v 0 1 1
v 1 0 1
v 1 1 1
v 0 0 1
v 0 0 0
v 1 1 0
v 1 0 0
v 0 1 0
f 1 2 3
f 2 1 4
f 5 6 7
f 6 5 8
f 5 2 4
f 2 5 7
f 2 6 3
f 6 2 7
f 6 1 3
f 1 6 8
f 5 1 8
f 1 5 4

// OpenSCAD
// file: math_utils.scad
// Math utilities for OpenSCAD
// Provides useful mathematical functions and constants

// Calculate distance between two 2D points
function distance_2d(p1, p2) = sqrt(pow(p2[0] - p1[0], 2) + pow(p2[1] - p1[1], 2));

// Calculate distance between two 3D points
function distance_3d(p1, p2) = sqrt(pow(p2[0] - p1[0], 2) + pow(p2[1] - p1[1], 2) + pow(p2[2] - p1[2], 2));

/* 
   Linear interpolation between two values
   t should be between 0 and 1
   Returns a + t * (b - a)
*/
function lerp(a, b, t) = a + t * (b - a);

// Clamp value between min and max
function clamp(value, min_val, max_val) = max(min_val, min(max_val, value));

// Convert degrees to radians
function deg_to_rad(degrees) = degrees * PI / 180;

// Convert radians to degrees  
function rad_to_deg(radians) = radians * 180 / PI;
// main file
use <math_utils.scad>

echo("This is a test of including another file.");
echo("The value of PI is: ", PI);

cube([1,1,1]);
